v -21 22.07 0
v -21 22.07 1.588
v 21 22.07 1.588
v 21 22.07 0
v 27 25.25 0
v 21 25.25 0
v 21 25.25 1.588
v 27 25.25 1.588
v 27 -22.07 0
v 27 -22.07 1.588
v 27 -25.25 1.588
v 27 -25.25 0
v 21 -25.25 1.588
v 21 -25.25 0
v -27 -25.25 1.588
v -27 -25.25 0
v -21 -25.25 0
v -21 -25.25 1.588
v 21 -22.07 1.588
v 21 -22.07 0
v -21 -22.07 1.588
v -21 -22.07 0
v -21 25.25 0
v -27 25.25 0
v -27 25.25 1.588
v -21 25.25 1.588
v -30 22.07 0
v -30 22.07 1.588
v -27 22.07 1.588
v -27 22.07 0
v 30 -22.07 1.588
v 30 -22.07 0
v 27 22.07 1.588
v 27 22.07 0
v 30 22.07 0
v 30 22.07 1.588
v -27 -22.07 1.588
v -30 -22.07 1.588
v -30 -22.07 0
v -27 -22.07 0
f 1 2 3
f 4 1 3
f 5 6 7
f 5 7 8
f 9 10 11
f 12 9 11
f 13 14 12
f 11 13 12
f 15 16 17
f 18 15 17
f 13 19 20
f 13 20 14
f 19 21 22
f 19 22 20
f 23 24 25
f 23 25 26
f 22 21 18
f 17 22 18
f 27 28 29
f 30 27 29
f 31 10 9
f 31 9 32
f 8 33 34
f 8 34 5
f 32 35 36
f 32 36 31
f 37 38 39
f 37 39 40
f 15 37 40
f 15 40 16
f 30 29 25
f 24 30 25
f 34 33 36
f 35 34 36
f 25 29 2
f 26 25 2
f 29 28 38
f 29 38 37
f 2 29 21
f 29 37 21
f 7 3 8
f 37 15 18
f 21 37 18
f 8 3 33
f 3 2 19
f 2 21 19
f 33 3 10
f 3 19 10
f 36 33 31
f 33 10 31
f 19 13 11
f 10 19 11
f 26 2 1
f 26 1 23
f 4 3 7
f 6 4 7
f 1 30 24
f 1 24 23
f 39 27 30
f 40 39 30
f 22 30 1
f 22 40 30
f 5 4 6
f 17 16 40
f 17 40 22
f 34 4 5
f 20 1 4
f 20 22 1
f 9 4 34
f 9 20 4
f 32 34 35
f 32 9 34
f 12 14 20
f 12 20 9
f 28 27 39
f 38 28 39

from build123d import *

# Parameters (mm, degrees)
SKETCH1_W           = 60
SKETCH1_H           = 25.25
BOSS_EXTRUDE1_DEPTH = 1.5875
SKETCH2_W           = 42
SKETCH2_H           = 3.18
SKETCH2_W_2         = 5.7
SKETCH2_W_3         = 5.8
CUT_EXTRUDE1_DEPTH  = 1.5875


with BuildPart() as part:
    # Sketch1 → Boss-Extrude1 (new body)
    with BuildSketch(Plane.XY):
        with Locations((0, 12.625)):
            Rectangle(SKETCH1_W, SKETCH1_H)
    boss_extrude1 = extrude(amount=BOSS_EXTRUDE1_DEPTH)

    # Sketch2 → Cut-Extrude1 (cut)
    with BuildSketch(Plane.XY.offset(1.5875)):
        with Locations((0, 23.66)):
            Rectangle(SKETCH2_W, SKETCH2_H)
        with Locations((29.85, 23.66)):
            Rectangle(SKETCH2_W_2, SKETCH2_H)
        with Locations((-29.9, 23.66)):
            Rectangle(SKETCH2_W_3, SKETCH2_H)
    cut_extrude1 = extrude(amount=-CUT_EXTRUDE1_DEPTH, mode=Mode.SUBTRACT)

    # Mirror1: Boss-Extrude1, Cut-Extrude1 across plane
    add(boss_extrude1.mirror(Plane.ZX))
    add(cut_extrude1.mirror(Plane.ZX), mode=Mode.SUBTRACT)


solid = part.part
